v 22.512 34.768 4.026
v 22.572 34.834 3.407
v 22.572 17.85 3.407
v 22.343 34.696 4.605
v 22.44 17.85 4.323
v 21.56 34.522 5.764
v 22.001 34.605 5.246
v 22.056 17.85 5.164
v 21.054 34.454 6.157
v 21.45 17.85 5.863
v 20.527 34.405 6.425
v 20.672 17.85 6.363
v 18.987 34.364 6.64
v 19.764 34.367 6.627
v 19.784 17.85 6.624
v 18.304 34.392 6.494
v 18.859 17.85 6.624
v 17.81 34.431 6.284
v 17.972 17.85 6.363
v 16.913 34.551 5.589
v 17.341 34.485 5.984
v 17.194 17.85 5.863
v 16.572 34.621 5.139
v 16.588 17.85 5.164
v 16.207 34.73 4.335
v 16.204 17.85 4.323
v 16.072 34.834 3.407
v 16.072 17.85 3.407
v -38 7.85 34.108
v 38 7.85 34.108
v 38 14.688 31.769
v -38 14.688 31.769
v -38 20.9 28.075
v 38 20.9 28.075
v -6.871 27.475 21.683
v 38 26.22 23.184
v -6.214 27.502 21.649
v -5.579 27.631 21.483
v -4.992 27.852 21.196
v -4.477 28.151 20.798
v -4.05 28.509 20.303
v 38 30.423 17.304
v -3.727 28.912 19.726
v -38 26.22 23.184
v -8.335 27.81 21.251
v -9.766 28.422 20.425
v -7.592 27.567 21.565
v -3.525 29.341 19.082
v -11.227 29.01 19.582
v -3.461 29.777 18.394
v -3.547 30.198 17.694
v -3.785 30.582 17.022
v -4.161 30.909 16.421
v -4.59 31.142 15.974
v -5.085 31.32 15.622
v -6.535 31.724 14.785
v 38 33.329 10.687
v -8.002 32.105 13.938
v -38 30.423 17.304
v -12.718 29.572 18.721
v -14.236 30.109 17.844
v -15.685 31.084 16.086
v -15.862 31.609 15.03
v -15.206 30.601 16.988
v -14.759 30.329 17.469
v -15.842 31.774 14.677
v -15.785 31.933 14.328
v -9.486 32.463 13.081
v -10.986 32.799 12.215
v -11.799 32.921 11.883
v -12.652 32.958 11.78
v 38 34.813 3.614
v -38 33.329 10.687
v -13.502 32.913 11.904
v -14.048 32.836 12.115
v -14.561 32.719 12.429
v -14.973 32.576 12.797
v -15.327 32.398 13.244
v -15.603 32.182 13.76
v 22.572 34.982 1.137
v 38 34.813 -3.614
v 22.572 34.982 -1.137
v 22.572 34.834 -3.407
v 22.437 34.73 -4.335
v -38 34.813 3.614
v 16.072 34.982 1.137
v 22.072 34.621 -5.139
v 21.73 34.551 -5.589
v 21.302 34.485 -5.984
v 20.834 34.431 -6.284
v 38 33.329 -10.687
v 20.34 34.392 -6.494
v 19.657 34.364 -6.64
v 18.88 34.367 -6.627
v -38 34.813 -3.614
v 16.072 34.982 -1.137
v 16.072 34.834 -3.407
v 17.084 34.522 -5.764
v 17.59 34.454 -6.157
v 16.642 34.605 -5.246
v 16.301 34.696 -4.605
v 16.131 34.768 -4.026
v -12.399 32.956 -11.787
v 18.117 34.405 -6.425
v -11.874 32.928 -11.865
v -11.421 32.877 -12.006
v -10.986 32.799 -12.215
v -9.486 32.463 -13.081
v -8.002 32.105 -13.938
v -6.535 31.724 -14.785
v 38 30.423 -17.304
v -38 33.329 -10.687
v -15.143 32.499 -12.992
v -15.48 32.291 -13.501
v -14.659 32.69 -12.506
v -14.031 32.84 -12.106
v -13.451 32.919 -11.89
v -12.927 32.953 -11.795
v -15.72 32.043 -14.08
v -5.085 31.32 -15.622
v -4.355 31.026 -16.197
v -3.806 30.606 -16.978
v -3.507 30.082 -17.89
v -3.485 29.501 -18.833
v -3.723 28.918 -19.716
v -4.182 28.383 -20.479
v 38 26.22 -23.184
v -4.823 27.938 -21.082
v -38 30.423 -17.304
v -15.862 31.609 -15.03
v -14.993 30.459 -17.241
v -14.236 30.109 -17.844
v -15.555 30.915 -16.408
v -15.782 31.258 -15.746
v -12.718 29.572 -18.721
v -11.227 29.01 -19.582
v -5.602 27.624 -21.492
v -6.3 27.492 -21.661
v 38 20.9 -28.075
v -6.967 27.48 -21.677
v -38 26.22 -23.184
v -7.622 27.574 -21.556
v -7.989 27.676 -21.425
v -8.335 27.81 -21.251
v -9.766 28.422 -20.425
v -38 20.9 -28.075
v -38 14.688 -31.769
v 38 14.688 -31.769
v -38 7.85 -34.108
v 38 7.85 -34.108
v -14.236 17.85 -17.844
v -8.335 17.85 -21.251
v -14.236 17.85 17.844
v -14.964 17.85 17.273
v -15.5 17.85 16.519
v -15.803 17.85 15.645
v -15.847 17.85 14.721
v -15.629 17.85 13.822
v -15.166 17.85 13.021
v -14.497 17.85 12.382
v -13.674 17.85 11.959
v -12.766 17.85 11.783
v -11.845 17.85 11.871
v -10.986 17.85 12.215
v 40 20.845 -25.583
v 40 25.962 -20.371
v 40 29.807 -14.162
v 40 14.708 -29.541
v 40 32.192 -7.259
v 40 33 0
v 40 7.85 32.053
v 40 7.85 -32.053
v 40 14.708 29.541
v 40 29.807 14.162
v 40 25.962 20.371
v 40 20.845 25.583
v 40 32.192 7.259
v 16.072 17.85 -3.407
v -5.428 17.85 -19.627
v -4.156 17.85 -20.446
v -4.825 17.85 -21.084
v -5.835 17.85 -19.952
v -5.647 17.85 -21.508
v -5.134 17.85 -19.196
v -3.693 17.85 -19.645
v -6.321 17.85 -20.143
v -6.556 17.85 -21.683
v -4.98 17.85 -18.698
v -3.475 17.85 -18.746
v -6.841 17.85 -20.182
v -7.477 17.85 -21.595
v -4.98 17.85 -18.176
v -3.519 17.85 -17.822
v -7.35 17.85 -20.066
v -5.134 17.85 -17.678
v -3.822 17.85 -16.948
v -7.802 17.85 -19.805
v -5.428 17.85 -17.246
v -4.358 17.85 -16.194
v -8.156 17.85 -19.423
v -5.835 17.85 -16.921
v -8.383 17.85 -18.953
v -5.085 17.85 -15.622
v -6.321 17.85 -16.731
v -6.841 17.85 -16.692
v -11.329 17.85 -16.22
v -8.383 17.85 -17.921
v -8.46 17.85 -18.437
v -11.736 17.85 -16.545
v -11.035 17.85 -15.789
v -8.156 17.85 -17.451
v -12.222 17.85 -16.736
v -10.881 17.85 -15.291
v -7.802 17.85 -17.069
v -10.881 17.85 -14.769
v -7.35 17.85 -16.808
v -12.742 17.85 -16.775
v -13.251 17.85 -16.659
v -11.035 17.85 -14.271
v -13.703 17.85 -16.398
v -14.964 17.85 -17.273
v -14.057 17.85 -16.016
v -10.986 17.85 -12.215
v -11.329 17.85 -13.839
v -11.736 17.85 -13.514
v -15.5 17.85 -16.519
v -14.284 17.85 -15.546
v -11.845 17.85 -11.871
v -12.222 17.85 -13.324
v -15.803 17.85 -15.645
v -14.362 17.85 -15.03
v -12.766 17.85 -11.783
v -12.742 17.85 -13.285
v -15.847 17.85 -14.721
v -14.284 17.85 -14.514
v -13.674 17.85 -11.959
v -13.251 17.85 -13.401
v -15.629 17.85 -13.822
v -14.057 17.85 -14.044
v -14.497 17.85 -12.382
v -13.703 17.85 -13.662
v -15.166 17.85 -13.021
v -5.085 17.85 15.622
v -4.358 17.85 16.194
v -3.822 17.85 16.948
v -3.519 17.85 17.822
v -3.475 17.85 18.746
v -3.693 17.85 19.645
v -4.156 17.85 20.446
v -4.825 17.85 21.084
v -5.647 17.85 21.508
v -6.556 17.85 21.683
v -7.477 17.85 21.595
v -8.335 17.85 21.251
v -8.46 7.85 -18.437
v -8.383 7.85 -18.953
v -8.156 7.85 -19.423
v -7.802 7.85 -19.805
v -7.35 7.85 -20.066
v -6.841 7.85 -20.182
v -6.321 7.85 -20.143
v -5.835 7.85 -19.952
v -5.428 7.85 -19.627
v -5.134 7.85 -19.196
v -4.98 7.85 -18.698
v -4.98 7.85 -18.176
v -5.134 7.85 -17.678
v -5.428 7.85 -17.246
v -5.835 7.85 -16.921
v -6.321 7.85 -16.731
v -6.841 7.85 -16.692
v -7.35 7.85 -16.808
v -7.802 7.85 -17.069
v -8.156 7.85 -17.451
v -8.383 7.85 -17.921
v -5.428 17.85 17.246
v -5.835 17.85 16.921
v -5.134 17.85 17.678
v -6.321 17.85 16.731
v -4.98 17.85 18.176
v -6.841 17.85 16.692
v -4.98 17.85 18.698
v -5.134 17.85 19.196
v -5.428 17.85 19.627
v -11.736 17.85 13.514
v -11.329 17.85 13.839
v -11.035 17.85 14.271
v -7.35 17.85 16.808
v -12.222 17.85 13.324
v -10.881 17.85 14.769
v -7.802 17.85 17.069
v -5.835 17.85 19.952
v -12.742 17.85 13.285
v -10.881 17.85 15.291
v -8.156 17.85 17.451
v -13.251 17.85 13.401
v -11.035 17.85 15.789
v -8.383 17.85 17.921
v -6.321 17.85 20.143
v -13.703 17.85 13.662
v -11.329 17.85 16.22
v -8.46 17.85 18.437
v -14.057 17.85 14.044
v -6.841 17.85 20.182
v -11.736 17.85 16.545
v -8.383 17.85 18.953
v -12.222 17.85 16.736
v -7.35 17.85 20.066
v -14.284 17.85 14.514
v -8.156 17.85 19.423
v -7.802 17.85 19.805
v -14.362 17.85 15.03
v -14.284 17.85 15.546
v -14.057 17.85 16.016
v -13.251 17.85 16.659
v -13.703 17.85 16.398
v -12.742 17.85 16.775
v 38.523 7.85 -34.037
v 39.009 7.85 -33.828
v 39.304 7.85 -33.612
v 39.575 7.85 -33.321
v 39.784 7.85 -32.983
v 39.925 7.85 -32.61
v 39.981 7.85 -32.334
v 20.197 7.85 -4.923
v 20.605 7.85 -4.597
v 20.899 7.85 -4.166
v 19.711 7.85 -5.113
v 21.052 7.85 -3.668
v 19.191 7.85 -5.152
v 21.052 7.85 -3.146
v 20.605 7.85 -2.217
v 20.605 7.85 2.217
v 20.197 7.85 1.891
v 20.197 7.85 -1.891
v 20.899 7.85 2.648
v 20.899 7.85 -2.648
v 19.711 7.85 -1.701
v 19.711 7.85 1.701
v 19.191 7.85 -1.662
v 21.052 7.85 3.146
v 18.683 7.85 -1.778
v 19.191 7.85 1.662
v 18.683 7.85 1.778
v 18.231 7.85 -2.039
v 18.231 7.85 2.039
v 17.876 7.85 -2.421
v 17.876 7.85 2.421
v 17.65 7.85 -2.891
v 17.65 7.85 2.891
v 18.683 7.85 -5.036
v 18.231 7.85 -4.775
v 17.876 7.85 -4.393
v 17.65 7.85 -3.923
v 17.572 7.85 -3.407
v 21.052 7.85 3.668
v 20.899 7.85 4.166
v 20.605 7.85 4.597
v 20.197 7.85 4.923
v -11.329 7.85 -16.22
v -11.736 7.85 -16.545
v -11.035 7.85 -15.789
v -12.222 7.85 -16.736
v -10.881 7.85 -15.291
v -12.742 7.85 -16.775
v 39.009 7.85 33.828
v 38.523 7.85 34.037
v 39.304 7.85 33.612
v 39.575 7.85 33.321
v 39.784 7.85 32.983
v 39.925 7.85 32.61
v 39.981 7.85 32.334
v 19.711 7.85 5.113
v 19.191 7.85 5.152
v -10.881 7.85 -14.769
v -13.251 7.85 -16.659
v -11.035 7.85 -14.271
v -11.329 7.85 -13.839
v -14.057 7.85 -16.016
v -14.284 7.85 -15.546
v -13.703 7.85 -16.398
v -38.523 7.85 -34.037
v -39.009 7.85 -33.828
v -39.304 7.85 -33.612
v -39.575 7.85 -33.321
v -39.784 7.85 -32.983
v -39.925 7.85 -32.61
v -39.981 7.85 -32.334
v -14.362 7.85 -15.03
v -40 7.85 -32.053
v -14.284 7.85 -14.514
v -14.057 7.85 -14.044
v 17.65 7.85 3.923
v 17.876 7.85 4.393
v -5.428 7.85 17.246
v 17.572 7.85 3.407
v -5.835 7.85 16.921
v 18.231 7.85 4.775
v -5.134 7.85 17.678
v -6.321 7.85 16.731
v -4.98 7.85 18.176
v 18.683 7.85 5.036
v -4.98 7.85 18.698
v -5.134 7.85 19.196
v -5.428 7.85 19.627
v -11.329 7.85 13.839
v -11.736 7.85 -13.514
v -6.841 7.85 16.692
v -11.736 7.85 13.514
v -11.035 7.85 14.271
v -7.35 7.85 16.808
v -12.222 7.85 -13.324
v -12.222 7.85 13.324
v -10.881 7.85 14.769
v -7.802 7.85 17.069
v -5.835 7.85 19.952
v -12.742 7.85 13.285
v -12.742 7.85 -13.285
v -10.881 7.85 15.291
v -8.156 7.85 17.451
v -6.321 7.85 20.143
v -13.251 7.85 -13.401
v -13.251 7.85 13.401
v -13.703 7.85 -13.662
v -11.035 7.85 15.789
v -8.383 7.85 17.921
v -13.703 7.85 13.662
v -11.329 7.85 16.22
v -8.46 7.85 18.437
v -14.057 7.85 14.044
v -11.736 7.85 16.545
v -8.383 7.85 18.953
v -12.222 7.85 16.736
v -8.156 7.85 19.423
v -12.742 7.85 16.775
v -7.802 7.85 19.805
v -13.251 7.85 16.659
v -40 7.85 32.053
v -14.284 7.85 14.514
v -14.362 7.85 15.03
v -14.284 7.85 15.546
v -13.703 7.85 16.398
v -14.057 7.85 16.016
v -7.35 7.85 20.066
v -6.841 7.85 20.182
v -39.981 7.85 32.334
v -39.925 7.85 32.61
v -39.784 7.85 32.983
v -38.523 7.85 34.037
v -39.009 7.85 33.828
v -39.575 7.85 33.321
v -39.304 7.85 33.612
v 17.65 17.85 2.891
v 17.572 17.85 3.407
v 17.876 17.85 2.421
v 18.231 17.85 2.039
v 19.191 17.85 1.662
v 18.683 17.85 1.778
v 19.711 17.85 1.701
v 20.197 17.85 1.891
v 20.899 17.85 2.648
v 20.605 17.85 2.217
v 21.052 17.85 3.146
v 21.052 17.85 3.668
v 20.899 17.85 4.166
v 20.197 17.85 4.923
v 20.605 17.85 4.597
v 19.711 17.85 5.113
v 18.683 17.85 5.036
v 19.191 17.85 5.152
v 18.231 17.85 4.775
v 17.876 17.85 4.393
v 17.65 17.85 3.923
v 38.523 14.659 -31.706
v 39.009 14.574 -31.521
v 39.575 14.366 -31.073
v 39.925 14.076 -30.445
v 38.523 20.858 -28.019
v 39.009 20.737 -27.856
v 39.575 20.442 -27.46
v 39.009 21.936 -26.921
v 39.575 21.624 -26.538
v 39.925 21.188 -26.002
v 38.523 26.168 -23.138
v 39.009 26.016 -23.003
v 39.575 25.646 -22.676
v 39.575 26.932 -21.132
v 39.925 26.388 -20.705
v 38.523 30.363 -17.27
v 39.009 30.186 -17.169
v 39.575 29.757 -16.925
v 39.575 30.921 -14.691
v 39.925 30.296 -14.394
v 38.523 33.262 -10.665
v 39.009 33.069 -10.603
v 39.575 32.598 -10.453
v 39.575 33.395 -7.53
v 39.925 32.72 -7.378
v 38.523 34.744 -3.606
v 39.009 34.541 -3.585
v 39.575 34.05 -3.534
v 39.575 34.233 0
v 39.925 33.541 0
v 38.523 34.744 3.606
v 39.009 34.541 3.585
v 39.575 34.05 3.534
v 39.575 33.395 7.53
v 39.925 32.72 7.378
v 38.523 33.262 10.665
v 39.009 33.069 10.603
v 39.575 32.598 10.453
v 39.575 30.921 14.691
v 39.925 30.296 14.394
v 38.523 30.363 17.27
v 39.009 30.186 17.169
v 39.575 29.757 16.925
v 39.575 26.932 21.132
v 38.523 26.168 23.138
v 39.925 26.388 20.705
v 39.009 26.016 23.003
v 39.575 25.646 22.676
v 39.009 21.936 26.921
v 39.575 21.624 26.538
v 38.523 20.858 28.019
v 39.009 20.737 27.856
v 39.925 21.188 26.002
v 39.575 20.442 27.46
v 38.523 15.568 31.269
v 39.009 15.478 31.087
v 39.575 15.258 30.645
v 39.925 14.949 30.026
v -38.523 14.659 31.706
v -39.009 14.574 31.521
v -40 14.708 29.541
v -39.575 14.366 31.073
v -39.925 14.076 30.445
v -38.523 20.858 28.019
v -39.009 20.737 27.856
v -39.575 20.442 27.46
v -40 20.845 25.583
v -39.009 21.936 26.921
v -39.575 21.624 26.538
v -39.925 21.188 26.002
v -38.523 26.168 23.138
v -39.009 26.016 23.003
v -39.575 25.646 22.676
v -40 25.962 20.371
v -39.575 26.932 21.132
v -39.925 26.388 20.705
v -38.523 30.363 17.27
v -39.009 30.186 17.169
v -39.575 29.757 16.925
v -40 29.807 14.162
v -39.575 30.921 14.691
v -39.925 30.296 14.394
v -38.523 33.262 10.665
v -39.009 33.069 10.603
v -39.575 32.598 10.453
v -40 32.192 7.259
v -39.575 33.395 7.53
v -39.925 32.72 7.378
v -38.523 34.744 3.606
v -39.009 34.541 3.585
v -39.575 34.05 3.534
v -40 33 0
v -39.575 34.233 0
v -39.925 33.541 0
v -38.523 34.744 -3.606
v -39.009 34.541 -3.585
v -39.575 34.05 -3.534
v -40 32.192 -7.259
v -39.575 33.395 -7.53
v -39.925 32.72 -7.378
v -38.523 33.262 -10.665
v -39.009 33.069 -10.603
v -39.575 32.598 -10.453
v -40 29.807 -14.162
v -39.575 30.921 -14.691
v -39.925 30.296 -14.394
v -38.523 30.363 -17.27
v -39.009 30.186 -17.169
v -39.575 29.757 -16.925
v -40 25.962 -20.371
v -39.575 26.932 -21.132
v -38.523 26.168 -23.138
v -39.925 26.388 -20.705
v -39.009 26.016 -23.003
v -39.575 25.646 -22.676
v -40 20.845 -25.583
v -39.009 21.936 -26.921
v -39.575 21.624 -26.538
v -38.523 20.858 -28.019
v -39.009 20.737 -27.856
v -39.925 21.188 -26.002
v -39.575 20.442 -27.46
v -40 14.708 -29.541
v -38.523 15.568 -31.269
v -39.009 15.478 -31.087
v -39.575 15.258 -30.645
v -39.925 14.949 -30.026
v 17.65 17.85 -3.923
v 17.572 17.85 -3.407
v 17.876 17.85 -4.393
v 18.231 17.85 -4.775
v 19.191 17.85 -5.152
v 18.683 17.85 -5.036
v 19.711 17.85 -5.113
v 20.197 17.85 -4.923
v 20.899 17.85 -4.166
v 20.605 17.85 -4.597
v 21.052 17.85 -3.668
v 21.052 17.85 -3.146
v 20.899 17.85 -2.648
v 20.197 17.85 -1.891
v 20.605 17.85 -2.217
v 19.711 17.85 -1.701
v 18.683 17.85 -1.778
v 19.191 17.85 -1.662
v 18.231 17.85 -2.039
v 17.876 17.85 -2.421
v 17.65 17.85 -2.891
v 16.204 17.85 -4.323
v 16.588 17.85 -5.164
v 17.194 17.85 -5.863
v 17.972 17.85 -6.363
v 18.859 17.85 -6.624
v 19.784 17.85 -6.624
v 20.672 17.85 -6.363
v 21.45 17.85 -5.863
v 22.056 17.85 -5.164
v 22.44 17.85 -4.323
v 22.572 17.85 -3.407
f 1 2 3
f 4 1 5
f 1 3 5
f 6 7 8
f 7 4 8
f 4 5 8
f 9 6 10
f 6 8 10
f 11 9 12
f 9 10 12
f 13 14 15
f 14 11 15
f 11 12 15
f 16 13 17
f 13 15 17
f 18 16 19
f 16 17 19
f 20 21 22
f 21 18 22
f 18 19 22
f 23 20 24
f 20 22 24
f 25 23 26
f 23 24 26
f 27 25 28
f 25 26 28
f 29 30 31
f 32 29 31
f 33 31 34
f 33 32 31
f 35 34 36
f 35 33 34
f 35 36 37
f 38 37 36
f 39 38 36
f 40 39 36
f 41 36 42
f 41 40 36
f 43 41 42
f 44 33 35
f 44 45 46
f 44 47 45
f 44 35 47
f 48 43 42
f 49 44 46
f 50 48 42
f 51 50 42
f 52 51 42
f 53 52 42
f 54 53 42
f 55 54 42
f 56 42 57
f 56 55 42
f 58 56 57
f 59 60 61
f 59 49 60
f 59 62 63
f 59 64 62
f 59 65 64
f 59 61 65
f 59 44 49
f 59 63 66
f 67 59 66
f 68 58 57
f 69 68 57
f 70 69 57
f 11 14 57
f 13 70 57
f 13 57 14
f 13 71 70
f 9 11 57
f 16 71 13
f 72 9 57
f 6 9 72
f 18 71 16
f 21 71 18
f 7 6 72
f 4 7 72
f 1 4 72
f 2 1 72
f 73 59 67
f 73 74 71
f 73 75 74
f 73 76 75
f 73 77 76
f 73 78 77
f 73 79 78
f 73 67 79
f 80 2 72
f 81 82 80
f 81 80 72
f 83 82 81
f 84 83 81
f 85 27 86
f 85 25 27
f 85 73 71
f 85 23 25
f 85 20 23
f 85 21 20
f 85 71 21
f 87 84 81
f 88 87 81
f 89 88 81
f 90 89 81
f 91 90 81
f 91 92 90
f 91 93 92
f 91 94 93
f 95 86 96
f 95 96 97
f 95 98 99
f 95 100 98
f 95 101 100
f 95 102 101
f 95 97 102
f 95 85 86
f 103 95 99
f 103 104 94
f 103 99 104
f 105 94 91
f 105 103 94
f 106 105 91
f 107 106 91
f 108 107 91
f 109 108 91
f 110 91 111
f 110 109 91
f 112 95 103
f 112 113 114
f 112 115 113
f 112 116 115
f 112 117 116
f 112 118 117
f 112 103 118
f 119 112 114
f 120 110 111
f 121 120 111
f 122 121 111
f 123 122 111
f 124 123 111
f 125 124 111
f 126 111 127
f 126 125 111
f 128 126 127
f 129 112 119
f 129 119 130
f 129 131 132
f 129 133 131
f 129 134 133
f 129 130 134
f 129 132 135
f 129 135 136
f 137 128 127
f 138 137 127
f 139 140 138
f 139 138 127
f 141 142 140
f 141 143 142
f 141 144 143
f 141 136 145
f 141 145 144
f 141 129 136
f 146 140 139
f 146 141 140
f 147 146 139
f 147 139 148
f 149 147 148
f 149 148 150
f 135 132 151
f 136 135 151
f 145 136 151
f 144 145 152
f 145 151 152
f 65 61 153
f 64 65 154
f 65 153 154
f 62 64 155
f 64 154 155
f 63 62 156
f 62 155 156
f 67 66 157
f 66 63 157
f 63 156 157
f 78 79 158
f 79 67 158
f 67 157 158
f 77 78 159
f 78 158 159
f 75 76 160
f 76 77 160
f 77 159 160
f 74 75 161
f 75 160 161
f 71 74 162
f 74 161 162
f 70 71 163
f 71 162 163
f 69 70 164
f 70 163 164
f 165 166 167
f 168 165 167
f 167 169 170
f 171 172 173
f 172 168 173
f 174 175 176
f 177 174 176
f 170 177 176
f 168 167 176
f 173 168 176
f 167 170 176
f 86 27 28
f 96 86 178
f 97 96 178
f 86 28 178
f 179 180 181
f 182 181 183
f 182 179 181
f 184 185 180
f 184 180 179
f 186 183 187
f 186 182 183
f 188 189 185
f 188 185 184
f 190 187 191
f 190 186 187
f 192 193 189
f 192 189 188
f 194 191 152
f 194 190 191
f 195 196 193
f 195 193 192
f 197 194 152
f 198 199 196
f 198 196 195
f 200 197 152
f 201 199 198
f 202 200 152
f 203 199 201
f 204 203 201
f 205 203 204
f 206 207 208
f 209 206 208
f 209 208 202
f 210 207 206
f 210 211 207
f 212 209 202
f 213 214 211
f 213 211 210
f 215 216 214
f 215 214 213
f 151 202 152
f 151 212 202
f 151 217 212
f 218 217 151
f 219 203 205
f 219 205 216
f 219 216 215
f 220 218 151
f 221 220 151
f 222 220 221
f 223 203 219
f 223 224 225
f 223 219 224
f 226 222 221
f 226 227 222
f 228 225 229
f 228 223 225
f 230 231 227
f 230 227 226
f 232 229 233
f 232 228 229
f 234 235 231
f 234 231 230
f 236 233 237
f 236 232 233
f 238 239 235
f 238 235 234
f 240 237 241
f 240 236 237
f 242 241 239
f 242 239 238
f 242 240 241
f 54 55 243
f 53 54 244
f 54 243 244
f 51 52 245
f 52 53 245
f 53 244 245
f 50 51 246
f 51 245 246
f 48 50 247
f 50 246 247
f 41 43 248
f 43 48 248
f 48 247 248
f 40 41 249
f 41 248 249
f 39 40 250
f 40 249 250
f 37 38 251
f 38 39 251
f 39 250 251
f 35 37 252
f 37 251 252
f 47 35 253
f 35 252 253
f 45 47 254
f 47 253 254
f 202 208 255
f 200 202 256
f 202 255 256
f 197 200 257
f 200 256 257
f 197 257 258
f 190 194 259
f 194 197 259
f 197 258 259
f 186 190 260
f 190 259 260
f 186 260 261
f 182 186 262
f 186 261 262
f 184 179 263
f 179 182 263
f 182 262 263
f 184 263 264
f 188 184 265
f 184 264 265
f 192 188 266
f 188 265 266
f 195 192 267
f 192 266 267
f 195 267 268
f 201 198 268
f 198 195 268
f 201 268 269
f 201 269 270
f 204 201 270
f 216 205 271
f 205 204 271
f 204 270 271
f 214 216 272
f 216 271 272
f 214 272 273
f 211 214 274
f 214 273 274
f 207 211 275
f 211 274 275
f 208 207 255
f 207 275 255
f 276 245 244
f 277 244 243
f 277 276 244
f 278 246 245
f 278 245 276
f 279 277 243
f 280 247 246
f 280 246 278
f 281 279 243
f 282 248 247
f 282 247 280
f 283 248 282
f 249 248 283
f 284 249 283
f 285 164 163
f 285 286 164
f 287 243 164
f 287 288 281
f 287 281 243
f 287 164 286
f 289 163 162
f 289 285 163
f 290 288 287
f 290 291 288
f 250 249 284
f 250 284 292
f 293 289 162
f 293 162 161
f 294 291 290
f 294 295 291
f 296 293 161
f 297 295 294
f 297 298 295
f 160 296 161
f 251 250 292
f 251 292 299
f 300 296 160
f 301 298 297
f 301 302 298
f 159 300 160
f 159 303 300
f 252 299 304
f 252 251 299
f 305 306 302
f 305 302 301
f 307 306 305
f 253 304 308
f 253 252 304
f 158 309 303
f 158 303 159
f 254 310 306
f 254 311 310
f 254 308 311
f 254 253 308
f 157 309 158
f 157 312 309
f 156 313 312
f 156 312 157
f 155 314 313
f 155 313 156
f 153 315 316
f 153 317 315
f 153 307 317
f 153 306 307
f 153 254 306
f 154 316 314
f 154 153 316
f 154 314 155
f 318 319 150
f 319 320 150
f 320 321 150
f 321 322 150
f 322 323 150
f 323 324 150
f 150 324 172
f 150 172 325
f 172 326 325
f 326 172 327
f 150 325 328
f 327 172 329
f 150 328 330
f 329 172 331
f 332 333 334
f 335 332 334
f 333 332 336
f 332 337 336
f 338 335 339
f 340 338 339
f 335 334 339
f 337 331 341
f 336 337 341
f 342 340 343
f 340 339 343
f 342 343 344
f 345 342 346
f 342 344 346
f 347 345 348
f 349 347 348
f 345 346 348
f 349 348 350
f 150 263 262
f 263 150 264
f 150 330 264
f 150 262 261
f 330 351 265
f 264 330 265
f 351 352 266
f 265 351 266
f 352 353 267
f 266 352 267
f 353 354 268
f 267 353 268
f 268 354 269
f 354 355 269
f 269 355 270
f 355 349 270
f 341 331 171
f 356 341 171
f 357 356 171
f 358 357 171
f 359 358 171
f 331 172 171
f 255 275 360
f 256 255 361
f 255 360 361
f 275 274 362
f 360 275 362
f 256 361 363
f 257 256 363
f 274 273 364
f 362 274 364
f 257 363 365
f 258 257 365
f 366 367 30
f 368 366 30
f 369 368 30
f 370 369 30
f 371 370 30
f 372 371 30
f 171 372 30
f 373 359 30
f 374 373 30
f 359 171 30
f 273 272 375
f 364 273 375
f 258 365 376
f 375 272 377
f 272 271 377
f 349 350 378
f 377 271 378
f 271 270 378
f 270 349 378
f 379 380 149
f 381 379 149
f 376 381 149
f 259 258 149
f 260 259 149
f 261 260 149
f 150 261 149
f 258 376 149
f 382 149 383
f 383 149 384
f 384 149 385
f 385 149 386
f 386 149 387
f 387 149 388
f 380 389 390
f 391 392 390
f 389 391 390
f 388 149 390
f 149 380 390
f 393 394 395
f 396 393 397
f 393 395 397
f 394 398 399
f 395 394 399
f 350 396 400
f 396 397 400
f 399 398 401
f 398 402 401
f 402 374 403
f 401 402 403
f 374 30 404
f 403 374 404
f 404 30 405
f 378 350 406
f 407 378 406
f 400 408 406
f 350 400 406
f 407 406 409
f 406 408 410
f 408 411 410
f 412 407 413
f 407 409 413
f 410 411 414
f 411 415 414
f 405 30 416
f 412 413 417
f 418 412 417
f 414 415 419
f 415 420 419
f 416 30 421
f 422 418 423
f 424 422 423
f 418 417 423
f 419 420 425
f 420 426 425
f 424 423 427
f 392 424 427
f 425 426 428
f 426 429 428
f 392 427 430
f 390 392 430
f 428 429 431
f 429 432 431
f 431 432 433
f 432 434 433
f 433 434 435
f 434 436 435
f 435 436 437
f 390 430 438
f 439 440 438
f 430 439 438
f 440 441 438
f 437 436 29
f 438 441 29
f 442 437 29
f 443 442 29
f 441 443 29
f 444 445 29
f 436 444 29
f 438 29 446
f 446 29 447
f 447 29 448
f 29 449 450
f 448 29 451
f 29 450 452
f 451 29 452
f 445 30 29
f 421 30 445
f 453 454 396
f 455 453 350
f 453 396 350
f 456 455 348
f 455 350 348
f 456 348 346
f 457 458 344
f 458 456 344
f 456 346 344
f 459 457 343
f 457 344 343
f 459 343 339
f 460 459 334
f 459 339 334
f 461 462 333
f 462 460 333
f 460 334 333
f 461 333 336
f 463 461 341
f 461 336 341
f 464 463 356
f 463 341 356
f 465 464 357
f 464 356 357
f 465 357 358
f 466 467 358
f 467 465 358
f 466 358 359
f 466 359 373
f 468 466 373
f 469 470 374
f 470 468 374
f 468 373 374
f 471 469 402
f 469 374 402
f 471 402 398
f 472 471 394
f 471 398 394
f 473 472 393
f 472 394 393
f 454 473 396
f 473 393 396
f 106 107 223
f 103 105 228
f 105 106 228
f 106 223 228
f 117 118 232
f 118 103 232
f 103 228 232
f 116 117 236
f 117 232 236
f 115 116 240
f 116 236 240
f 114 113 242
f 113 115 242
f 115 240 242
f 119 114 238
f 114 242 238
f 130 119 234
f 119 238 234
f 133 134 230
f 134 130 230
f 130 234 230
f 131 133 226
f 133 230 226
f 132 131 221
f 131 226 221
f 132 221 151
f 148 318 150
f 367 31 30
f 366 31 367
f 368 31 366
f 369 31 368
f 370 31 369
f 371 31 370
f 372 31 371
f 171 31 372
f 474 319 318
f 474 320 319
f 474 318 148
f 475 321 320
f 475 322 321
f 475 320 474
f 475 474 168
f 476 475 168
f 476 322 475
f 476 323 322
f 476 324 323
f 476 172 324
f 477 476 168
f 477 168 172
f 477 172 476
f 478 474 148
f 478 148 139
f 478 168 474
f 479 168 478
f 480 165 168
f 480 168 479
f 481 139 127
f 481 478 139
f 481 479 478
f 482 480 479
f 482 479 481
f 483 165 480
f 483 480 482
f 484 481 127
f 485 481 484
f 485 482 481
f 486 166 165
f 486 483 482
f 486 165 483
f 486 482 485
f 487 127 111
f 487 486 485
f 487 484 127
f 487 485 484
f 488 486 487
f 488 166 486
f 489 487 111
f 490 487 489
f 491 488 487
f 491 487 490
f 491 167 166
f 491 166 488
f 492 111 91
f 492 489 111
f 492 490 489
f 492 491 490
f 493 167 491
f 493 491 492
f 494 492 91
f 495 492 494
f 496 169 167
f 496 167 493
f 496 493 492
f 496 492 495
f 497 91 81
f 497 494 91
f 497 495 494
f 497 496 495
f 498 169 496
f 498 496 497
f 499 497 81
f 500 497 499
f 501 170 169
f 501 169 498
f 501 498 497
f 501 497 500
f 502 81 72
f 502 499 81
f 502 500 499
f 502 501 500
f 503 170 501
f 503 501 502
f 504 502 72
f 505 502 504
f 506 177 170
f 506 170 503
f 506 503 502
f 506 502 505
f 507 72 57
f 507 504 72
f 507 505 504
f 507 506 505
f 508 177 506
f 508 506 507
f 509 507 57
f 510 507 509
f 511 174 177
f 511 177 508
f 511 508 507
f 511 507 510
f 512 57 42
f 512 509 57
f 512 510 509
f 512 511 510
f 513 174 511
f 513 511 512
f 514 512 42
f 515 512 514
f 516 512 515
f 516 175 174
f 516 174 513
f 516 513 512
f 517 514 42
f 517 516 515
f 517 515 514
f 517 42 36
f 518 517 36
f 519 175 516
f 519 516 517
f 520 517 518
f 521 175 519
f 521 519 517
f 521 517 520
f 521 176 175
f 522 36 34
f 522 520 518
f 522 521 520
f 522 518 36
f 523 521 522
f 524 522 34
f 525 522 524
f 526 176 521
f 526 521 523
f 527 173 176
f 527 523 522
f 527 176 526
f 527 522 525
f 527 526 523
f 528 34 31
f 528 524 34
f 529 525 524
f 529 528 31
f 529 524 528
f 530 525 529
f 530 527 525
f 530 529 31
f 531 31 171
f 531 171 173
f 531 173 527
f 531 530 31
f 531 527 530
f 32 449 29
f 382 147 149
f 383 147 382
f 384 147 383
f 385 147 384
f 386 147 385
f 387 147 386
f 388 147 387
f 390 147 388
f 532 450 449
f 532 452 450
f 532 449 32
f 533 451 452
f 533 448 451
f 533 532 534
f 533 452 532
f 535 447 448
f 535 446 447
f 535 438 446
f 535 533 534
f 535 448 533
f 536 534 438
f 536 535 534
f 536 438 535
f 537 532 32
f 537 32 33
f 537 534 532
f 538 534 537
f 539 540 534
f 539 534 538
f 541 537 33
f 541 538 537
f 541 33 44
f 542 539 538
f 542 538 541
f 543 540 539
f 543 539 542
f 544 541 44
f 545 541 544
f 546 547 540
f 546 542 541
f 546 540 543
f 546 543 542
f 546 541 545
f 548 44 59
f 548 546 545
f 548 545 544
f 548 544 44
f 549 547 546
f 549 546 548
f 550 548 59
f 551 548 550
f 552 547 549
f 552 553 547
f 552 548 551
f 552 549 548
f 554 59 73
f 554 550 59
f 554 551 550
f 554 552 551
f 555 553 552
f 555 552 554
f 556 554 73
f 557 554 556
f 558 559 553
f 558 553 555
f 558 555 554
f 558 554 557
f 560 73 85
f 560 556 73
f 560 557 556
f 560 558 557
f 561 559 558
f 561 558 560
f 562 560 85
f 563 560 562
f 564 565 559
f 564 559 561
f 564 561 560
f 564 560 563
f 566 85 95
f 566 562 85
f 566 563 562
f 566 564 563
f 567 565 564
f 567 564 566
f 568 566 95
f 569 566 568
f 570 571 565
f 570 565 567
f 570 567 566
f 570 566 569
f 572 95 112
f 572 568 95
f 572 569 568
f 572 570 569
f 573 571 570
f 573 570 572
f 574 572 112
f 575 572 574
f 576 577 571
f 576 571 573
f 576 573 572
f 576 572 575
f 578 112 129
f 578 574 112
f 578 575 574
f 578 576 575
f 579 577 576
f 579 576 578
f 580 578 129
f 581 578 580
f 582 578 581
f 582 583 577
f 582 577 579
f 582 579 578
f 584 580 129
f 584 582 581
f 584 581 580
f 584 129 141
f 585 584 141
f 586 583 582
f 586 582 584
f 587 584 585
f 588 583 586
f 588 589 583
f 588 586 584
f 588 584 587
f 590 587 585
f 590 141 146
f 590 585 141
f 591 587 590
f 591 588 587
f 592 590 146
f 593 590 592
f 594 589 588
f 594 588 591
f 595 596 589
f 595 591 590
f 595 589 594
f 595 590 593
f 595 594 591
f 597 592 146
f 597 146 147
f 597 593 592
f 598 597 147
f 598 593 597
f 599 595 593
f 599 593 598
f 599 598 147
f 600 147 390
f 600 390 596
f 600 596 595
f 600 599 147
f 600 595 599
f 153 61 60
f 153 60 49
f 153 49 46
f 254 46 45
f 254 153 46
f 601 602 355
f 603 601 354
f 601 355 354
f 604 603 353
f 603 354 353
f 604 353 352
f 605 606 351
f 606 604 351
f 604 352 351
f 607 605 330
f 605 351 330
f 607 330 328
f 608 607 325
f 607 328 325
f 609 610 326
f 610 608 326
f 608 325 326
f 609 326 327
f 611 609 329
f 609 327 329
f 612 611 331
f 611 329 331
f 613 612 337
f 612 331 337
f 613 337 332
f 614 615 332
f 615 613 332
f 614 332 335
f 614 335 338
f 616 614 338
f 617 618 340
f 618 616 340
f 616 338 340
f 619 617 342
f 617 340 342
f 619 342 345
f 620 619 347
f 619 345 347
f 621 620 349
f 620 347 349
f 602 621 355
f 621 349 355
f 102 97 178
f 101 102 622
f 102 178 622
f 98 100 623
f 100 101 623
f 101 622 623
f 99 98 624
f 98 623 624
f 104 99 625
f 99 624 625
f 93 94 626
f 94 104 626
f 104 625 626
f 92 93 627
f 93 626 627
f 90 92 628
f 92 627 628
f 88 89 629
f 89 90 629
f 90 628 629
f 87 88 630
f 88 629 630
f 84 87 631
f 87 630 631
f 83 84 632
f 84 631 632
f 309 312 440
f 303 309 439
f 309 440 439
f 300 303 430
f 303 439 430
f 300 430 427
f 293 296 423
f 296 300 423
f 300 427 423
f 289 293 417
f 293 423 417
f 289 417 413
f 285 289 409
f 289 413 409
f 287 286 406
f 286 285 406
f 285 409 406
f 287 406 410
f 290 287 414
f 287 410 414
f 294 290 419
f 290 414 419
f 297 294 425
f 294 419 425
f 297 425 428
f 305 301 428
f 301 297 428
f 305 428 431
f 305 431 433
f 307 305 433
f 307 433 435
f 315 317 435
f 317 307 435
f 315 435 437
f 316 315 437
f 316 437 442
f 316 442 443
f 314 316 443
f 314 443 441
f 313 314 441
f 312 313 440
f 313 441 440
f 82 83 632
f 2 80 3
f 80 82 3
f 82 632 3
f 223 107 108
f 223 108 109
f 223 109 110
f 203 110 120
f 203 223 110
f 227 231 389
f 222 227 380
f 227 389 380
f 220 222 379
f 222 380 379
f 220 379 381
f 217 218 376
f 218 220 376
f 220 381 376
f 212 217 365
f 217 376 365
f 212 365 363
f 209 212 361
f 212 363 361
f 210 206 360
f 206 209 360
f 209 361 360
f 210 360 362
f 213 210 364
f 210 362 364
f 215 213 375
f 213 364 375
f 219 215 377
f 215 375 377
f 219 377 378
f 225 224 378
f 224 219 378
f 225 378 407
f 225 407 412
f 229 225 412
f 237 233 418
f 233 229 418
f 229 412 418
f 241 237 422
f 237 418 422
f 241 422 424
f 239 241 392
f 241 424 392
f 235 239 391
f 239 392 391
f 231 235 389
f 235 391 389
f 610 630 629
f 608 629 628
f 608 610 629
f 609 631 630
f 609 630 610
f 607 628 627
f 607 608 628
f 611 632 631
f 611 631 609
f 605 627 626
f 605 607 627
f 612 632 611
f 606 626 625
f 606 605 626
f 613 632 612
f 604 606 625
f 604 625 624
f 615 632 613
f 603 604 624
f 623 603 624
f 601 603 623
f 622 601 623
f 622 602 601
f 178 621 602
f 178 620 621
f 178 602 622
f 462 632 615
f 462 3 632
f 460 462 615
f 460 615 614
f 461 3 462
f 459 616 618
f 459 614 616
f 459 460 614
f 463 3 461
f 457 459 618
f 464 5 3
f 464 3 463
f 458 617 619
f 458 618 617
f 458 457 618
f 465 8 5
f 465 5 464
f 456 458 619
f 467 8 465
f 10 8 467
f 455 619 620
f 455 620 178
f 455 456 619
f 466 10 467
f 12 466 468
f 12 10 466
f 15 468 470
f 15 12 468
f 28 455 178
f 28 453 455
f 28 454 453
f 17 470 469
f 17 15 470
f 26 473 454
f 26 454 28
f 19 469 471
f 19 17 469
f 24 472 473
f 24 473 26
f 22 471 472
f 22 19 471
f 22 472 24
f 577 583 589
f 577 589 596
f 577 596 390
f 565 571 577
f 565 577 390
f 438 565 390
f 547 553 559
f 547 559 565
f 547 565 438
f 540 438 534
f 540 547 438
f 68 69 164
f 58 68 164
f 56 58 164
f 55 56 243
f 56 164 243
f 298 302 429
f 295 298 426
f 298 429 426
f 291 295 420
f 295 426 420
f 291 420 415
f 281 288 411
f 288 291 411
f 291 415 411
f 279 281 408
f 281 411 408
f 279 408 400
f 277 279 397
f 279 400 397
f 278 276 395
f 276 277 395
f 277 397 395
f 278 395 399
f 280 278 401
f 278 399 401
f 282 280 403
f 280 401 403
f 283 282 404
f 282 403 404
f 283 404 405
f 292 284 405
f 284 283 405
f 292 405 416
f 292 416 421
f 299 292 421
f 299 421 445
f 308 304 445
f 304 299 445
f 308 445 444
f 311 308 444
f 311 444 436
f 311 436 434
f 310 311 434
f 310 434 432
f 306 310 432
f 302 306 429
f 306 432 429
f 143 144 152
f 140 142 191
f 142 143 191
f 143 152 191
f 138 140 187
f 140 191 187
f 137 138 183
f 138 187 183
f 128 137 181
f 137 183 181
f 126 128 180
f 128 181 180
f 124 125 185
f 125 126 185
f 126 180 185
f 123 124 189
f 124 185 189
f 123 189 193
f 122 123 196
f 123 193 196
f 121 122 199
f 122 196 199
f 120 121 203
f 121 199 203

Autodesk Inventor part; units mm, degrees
ref_plane "YZ Plane" through (0, 0, 0) normal (1, 0, 0) x (0, 1, 0)
ref_plane "XZ Plane" through (0, 0, 0) normal (0, 1, 0) x (-1, 0, 0)
ref_plane "XY Plane" through (0, 0, 0) normal (0, 0, 1) x (1, 0, 0)
sketch "Szkic1" plane through (0, 0, 0) normal (0, 1, 0) x (-1, 0, 0)
  circle A0 centre (0, 0) radius 19.62 construction
  line L0 (0, 0) -> (-19.62, 0) construction
  circle A1 centre (0, 0) radius 22.5 construction
  circle A2 centre (-19.3219, 3.407) radius 1.75
  circle A3 centre (-19.3219, -3.407) radius 1.75
  circle A4 centre (6.7104, 18.4368) radius 1.75
  circle A5 centre (12.6115, 15.0298) radius 1.75
  circle A6 centre (12.6115, -15.0298) radius 1.75
  circle A7 centre (6.7104, -18.4368) radius 1.75
  circle A8 centre (0, 0) radius 35
  circle A9 centre (-19.3219, 3.407) radius 3.25
  circle A10 centre (-19.3219, -3.407) radius 3.25
  circle A11 centre (6.7104, -18.4368) radius 3.25
  circle A12 centre (12.6115, -15.0298) radius 3.25
  circle A13 centre (12.6115, 15.0298) radius 3.25
  circle A14 centre (6.7104, 18.4368) radius 3.25
  line L1 (14.2365, 17.8444) -> (8.3354, 21.2514)
  line L2 (10.9865, 12.2152) -> (5.0854, 15.6222)
  line L3 (-16.0719, 3.407) -> (-16.0719, -3.407)
  line L4 (14.2365, -17.8444) -> (8.3354, -21.2514)
  line L5 (10.9865, -12.2152) -> (5.0854, -15.6222)
  line L6 (-22.5719, -3.407) -> (-22.5719, 3.407)
  line L7 (-40, 35) -> (40, 35)
  line L8 (40, 35) -> (40, -35)
  line L9 (40, -35) -> (-40, -35)
  line L10 (-40, -35) -> (-40, 35)
  line L11 (-40, 35) -> (40, -35) construction
  line L12 (40, 35) -> (-40, -35) construction
  line L13 (0, -35) -> (0, 35)
  line L14 (40, 0) -> (-40, 0)
  line L15 (56, 0) -> (-56, 0) projected
  point P0 (0, -35)
  point P1 (0, 35)
  point P2 (35, 0)
  point P3 (-35, 0)
  dimension "d0" = 39.24
  dimension "d1" = 3.5
  dimension "d2" = 20
  dimension "d5" = 360
  dimension "d7" = 45
  dimension "d8" = 70
  dimension "d12" = 6.5
  dimension "d15" = 360
  dimension "d27" = 80
  dimension "d28" = 70
revolve "Obrót2" add sketch "Szkic1" angle 180 about axis through (-10, 0, 0) along (-1, 0, 0) picked at (16.0586, 3.9431) contours A2 | A4 | A5 | L14 L13 A8 | A8 L7 L8 L14 | L13 L14 L3 A9 L6 A8 | A8 L14 L10 L7 | L14 L6 A9 L3 | A9 | A13 | A13 L2 A14 L1 | A14
extrude "Wyciągnięcie proste1" cut sketch "Szkic1" along normal through all contours A2 | A3 | A4 | A5 | A6 | A7 | L14 L6 A9 L3 | L3 A10 L6 L14 | A9 | A10 | A11 | A11 L5 A12 L4 | A12 | A13 | A13 L2 A14 L1 | A14
extrude "Wyciągnięcie proste2" add sketch "Szkic1" along normal blind 17.85 contours L14 L6 A9 L3 | L3 A10 L6 L14 | A9 | A10 | A11 | A11 L5 A12 L4 | A12 | A13 | A13 L2 A14 L1 | A14
extrude "Wyciągnięcie proste3" cut sketch "Szkic1" along normal blind 7.85 contours A2 | A3 | A4 | A5 | A6 | A7 | L14 L13 A8 | L14 L8 L9 A8 | A8 L7 L8 L14 | A8 L13 L14 | L13 L14 L3 A9 L6 A8 | A8 L14 L10 L7 | L9 L10 L14 A8 | A8 L14 L6 A10 L3 L13 | L14 L6 A9 L3 | L3 A10 L6 L14 | A9 | A10 | A11 | A11 L5 A12 L4 | A12 | A13 | A13 L2 A14 L1 | A14
fillet "Zaokrąglenie1" radius 2 2 edges at (-40, 35, 0) (40, 35, 0)
properties part number "semicylinder_1"
